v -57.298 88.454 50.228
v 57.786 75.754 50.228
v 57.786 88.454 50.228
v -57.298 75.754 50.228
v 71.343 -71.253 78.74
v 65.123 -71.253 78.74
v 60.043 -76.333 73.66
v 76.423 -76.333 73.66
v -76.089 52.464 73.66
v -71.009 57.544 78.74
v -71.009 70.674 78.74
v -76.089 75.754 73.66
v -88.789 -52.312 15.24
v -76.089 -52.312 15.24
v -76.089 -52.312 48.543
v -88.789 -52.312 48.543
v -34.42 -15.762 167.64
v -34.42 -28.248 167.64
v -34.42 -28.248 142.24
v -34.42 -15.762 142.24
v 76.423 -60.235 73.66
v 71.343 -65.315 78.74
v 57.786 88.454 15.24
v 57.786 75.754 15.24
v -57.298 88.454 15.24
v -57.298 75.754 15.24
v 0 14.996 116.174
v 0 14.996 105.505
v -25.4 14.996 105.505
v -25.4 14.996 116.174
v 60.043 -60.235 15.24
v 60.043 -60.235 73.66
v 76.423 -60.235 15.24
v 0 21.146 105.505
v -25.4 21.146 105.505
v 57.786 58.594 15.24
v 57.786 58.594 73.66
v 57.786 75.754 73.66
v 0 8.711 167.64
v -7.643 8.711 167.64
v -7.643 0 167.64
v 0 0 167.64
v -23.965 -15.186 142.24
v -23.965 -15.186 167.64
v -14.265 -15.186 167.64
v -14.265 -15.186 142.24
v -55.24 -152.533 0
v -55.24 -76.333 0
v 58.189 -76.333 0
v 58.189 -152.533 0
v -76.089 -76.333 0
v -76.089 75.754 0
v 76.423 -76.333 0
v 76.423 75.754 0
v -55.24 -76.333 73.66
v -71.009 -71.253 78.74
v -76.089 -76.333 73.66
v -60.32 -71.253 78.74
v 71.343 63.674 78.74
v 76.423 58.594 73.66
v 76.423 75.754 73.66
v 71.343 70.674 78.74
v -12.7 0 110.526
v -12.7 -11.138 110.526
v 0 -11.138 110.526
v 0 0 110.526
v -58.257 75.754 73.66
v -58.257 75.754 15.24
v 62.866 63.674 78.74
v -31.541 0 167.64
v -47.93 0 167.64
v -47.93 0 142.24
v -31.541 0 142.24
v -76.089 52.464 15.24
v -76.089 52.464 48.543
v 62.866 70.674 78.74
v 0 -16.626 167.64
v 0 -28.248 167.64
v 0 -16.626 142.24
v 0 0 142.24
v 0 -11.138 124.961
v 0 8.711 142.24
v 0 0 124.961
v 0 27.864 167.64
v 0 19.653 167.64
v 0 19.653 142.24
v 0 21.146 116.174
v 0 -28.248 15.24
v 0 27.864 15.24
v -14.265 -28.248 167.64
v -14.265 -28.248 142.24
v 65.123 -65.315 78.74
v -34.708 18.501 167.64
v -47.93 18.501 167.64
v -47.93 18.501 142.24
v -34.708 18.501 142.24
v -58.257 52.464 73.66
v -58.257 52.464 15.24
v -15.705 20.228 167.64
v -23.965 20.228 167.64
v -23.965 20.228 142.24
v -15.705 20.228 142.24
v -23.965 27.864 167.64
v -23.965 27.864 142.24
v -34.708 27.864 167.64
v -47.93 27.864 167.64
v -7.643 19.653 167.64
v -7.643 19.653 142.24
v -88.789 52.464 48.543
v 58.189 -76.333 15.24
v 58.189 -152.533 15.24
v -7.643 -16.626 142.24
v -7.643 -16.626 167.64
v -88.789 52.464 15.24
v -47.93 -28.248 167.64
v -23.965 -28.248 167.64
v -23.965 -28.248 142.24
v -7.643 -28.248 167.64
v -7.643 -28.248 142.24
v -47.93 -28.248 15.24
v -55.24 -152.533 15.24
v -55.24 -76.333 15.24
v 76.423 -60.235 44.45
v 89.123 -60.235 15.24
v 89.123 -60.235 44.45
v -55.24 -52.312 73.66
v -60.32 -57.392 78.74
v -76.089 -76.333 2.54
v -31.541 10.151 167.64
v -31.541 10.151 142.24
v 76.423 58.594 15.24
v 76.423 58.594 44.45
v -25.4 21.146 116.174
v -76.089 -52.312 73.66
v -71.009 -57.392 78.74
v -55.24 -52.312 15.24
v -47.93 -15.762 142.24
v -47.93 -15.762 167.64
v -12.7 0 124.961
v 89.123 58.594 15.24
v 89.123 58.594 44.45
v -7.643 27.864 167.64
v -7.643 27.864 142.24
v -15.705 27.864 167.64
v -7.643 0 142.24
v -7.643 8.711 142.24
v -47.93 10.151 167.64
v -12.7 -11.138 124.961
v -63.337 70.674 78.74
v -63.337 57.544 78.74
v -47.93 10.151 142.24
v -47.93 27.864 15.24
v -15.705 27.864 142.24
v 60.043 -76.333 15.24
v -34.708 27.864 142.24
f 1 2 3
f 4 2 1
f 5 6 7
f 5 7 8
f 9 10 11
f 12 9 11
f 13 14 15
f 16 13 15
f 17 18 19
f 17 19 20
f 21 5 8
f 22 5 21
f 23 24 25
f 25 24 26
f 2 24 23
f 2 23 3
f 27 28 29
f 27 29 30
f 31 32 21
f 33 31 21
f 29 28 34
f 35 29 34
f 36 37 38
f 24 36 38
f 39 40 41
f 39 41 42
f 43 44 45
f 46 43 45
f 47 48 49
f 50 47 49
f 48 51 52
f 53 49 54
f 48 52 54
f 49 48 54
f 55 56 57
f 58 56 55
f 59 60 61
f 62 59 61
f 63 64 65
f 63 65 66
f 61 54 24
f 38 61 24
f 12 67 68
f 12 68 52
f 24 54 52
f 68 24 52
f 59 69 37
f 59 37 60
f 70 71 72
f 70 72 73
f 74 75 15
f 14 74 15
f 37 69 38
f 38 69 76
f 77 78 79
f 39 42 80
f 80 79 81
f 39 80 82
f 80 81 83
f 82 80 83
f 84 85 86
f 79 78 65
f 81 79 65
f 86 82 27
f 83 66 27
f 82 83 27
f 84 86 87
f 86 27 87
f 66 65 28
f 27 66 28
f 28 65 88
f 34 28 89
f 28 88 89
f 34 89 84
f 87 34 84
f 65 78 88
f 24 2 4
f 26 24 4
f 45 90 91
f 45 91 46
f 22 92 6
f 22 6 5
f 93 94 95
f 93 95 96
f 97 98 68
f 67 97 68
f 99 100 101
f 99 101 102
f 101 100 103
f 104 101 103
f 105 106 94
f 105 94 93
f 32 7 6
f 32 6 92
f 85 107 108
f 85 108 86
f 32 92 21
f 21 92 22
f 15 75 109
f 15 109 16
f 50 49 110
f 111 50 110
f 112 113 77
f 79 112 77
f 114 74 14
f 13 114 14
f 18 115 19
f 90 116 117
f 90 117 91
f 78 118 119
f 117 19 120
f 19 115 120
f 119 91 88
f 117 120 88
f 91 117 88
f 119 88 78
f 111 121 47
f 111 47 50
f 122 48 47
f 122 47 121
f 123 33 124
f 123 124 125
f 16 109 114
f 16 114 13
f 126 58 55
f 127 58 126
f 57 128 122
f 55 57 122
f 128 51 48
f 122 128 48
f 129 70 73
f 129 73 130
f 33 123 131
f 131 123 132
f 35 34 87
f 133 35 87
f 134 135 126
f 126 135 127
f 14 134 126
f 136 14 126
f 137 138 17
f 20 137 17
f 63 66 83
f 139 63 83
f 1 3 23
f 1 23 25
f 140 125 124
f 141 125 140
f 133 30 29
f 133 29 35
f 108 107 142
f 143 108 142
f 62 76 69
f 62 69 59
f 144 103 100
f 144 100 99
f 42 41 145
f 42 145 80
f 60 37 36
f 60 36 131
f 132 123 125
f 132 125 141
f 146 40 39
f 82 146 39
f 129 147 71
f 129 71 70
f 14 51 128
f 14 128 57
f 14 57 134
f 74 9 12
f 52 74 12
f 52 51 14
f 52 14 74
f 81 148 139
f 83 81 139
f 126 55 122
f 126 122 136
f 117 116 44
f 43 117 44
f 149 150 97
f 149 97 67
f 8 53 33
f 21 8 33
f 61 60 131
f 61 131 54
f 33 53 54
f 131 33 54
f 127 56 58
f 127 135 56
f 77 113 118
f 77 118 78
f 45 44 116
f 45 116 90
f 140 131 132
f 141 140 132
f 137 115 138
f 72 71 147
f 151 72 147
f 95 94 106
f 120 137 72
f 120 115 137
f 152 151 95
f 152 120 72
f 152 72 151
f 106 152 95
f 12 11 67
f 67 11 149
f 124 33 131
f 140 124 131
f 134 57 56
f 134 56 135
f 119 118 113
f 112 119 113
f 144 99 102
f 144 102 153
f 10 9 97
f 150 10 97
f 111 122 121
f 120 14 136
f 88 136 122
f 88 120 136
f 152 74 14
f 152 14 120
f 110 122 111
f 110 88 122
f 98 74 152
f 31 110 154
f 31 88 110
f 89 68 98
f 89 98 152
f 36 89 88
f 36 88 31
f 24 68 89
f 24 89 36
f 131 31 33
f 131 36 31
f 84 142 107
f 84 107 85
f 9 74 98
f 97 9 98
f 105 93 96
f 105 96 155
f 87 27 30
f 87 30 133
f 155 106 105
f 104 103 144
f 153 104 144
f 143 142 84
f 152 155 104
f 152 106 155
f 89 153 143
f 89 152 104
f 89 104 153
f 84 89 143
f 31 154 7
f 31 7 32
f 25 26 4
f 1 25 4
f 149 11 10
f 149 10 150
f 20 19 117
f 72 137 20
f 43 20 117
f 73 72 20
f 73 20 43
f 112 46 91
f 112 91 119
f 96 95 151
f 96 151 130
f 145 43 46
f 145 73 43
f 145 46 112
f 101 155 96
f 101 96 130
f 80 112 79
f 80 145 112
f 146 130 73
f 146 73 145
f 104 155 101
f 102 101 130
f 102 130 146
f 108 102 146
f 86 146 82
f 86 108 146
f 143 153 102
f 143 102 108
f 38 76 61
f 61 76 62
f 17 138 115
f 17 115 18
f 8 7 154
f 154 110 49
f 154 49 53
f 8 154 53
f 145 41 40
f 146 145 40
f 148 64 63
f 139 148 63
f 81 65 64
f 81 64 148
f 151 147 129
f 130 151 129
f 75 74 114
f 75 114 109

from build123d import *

# Parameters (mm, degrees)
F0_W      = 152.5124907494
F0_H      = 152.087032795
F1_DEPTH  = 2.54
F2_W      = 20.8487436175
F2_H      = 24.0208171308
F3_DEPTH  = 76.2
F2_W_2    = 17.8325101733
F2_H_2    = 23.2902280986
F4_DEPTH  = 76.2
F2_W_3    = 16.3801498711
F2_H_3    = 16.0977393389
F2_W_4    = 18.6377316713
F2_H_4    = 17.1602889895
F5_DEPTH  = 76.2
F6_DEPTH  = 12.7
F6_FACE_W = 20.8487436175
F6_FACE_H = 24.0208171308
F7_DEPTH  = 12.7
F8_SIZE   = 5.08
F12_W     = 118.8290044665
F12_H     = 29.21
F13_DEPTH = 12.7
F15_W     = 115.0837503374
F15_H     = 34.9880257642
F16_DEPTH = 12.7
F17_W     = 104.7759875655
F17_H     = 33.3026150262
F18_DEPTH = 12.7
F19_W     = 113.4291402996
F19_H     = 15.24
F20_DEPTH = 76.2
F22_W     = 47.9301847517
F22_H     = 56.1127942055
F23_DEPTH = 127
F24_W     = 13.509940356
F24_H     = 12.4862398952
F25_DEPTH = 25.4
F24_W_2   = 16.3891837001
F24_H_2   = 10.1510994136
F26_DEPTH = 25.4
F24_W_3   = 13.2220201194
F24_H_3   = 9.3634463847
F27_DEPTH = 25.4
F24_W_4   = 8.2599930465
F24_H_4   = 7.6358895749
F28_DEPTH = 25.4
F24_W_5   = 7.6431990601
F24_H_5   = 8.2117523998
F29_DEPTH = 25.4
F24_H_6   = 8.7114600465
F30_DEPTH = 25.4
F24_H_7   = 11.6224680096
F31_DEPTH = 25.4
F24_W_6   = 9.6996221691
F24_H_8   = 13.0620943382
F32_DEPTH = 25.4
F33_W     = 11.1384242773
F33_H     = 14.4351422787
F34_DEPTH = 12.7
F33_W_2   = 6.1493515968
F33_H_2   = 10.6694698334
F35_DEPTH = 25.4


# Not quite as in the source:
# - two fillets or chamfers of one size are made in one step
# - the program builds the solid bodies; features that only make, move or delete a surface that nothing else refers to are left out


with BuildPart() as f1:
    # F0 (on Top) → F1 (new body)
    with BuildSketch(Plane.XY):
        with Locations((0.1670345664, -0.2893134952)):
            Rectangle(F0_W, F0_H)
    extrude(amount=F1_DEPTH)

    # F2 (on face) → F3 (join)
    with BuildSketch(Plane.XY.offset(2.54)):
        with Locations((-65.6648389995, -64.3224213272)):
            Rectangle(F2_W, F2_H)
    extrude(amount=F3_DEPTH)

    # F2 (on face) → F4 (join)
    with BuildSketch(Plane.XY.offset(2.54)):
        with Locations((-67.1729557216, 64.109088853)):
            Rectangle(F2_W_2, F2_H_2)
    extrude(amount=F4_DEPTH)

    # F2 (on face) → F5 (join)
    with BuildSketch(Plane.XY.offset(2.54)):
        with Locations((68.2332050055, -68.2839602232)):
            Rectangle(F2_W_3, F2_H_3)
        with Locations((67.1044141054, 67.1740584075)):
            Rectangle(F2_W_4, F2_H_4)
    extrude(amount=F5_DEPTH)

    # F6 (cut): a face of the model
    f6_faces = [f1.faces().sort_by_distance(p)[0] for p in [
        (-65.6648389995, -64.3224213272, 78.74),
    ]]
    extrude(f6_faces, amount=-F6_DEPTH, mode=Mode.SUBTRACT)

    # F2 (on face) + F6_face (on face) → F7 (join)
    with BuildSketch(Plane.XY.offset(2.54)):
        Polygon((-55.2404671907, -52.3120127618), (-55.2404671907, -76.3328298926), (60.04313007, -76.3328298926), (60.04313007, -60.2350905538), (76.4232799411, -60.2350905538), (76.4232799411, 58.5939139128), (57.7855482697, 58.5939139128), (57.7855482697, 75.7542029023), (-58.256700635, 75.7542029023), (-58.256700635, 52.4639748037), (-76.0892108083, 52.4639748037), (-76.0892108083, -52.3120127618), align=None)
    with BuildSketch(Plane(origin=(-65.6648389995, -64.3224213272, 66.04), x_dir=(1, 0, 0), z_dir=(0, 0, 1))):
        Rectangle(F6_FACE_W, F6_FACE_H)
    extrude(amount=F7_DEPTH)

    # F8
    f8_edges = [f1.edges().sort_by_distance(p)[0] for p in [
        (-65.664839, -76.33283, 78.74),
        (-76.089211, -64.322421, 78.74),
        (-76.089211, 64.109089, 78.74),
        (76.42328, -68.28396, 78.74),
        (76.42328, 67.174058, 78.74),
        (67.104414, 58.593914, 78.74),
        (67.104414, 75.754203, 78.74),
        (57.785548, 67.174058, 78.74),
        (68.233205, -60.235091, 78.74),
        (60.04313, -68.28396, 78.74),
        (68.233205, -76.33283, 78.74),
        (-55.240467, -64.322421, 78.74),
        (-65.664839, -52.312013, 78.74),
        (-58.256701, 64.109089, 78.74),
        (-67.172956, 52.463975, 78.74),
        (-67.172956, 75.754203, 78.74),
    ]]
    chamfer(f8_edges, length=F8_SIZE)

    # F19 (on face) → F20 (join)
    with BuildSketch(Plane.XZ.offset(76.3328298926)):
        with Locations((1.474102959, 7.62)):
            Rectangle(F19_W, F19_H)
    extrude(amount=F20_DEPTH)

    # F22 (on face) → F23 (join)
    with BuildSketch(Plane.XY.offset(15.24)):
        with Locations((-23.9650923759, -0.1920359209)):
            Rectangle(F22_W, F22_H)
    extrude(amount=F23_DEPTH)

    # F24 (on face) → F25 (join)
    with BuildSketch(Plane.XY.offset(142.24)):
        with Locations((-41.1752145737, -22.0053130761)):
            Rectangle(F24_W, F24_H)
    extrude(amount=F25_DEPTH)

    # F24 (on face) → F26 (join)
    with BuildSketch(Plane.XY.offset(142.24)):
        with Locations((-39.7355929017, 5.0755497068)):
            Rectangle(F24_W_2, F24_H_2)
    extrude(amount=F26_DEPTH)

    # F24 (on face) → F27 (join)
    with BuildSketch(Plane.XY.offset(142.24)):
        with Locations((-41.319174692, 23.1826379895)):
            Rectangle(F24_W_3, F24_H_3)
    extrude(amount=F27_DEPTH)

    # F24 (on face) → F28 (join)
    with BuildSketch(Plane.XY.offset(142.24)):
        with Locations((-19.8350958526, 24.0464163944)):
            Rectangle(F24_W_4, F24_H_4)
    extrude(amount=F28_DEPTH)

    # F24 (on face) → F29 (join)
    with BuildSketch(Plane.XY.offset(142.24)):
        with Locations((-3.8215995301, 23.758484982)):
            Rectangle(F24_W_5, F24_H_5)
    extrude(amount=F29_DEPTH)

    # F24 (on face) → F30 (join)
    with BuildSketch(Plane.XY.offset(142.24)):
        with Locations((-3.8215995301, 4.3557300232)):
            Rectangle(F24_W_5, F24_H_6)
    extrude(amount=F30_DEPTH)

    # F24 (on face) → F31 (join)
    with BuildSketch(Plane.XY.offset(142.24)):
        with Locations((-3.8215995301, -22.4371990189)):
            Rectangle(F24_W_5, F24_H_7)
    extrude(amount=F31_DEPTH)

    # F24 (on face) → F32 (join)
    with BuildSketch(Plane.XY.offset(142.24)):
        with Locations((-19.1152812913, -21.7173858546)):
            Rectangle(F24_W_6, F24_H_8)
    extrude(amount=F32_DEPTH)

    # F33 (on face) → F34 (cut)
    with BuildSketch(Plane.YZ):
        with Locations((-5.5692121387, 117.7433207631)):
            Rectangle(F33_W, F33_H)
    extrude(amount=-F34_DEPTH, mode=Mode.SUBTRACT)

    # F33 (on face) → F35 (cut)
    with BuildSketch(Plane.YZ):
        with Locations((18.0709660053, 110.8395680785)):
            Rectangle(F33_W_2, F33_H_2)
    extrude(amount=-F35_DEPTH, mode=Mode.SUBTRACT)


with BuildPart() as f13:
    # F12 (on face) → F13 (new body)
    with BuildSketch(Plane.YZ.offset(76.4232799411)):
        with Locations((-0.8205883205, 29.845)):
            Rectangle(F12_W, F12_H)
    extrude(amount=F13_DEPTH)


with BuildPart() as f16:
    # F15 (on face) → F16 (new body)
    with BuildSketch(Plane(origin=(0, 75.7542029023, 0), x_dir=(-1, 0, 0), z_dir=(0, 1, 0))):
        with Locations((-0.2436731011, 32.7340128821)):
            Rectangle(F15_W, F15_H)
    extrude(amount=F16_DEPTH)


with BuildPart() as f18:
    # F17 (on face) → F18 (new body)
    with BuildSketch(Plane(origin=(-76.0892108083, 0, 0), x_dir=(0, -1, 0), z_dir=(-1, 0, 0))):
        with Locations((-0.0759810209, 31.8913075131)):
            Rectangle(F17_W, F17_H)
    extrude(amount=F18_DEPTH)


solid = Compound([f1.part, f13.part, f16.part, f18.part])
